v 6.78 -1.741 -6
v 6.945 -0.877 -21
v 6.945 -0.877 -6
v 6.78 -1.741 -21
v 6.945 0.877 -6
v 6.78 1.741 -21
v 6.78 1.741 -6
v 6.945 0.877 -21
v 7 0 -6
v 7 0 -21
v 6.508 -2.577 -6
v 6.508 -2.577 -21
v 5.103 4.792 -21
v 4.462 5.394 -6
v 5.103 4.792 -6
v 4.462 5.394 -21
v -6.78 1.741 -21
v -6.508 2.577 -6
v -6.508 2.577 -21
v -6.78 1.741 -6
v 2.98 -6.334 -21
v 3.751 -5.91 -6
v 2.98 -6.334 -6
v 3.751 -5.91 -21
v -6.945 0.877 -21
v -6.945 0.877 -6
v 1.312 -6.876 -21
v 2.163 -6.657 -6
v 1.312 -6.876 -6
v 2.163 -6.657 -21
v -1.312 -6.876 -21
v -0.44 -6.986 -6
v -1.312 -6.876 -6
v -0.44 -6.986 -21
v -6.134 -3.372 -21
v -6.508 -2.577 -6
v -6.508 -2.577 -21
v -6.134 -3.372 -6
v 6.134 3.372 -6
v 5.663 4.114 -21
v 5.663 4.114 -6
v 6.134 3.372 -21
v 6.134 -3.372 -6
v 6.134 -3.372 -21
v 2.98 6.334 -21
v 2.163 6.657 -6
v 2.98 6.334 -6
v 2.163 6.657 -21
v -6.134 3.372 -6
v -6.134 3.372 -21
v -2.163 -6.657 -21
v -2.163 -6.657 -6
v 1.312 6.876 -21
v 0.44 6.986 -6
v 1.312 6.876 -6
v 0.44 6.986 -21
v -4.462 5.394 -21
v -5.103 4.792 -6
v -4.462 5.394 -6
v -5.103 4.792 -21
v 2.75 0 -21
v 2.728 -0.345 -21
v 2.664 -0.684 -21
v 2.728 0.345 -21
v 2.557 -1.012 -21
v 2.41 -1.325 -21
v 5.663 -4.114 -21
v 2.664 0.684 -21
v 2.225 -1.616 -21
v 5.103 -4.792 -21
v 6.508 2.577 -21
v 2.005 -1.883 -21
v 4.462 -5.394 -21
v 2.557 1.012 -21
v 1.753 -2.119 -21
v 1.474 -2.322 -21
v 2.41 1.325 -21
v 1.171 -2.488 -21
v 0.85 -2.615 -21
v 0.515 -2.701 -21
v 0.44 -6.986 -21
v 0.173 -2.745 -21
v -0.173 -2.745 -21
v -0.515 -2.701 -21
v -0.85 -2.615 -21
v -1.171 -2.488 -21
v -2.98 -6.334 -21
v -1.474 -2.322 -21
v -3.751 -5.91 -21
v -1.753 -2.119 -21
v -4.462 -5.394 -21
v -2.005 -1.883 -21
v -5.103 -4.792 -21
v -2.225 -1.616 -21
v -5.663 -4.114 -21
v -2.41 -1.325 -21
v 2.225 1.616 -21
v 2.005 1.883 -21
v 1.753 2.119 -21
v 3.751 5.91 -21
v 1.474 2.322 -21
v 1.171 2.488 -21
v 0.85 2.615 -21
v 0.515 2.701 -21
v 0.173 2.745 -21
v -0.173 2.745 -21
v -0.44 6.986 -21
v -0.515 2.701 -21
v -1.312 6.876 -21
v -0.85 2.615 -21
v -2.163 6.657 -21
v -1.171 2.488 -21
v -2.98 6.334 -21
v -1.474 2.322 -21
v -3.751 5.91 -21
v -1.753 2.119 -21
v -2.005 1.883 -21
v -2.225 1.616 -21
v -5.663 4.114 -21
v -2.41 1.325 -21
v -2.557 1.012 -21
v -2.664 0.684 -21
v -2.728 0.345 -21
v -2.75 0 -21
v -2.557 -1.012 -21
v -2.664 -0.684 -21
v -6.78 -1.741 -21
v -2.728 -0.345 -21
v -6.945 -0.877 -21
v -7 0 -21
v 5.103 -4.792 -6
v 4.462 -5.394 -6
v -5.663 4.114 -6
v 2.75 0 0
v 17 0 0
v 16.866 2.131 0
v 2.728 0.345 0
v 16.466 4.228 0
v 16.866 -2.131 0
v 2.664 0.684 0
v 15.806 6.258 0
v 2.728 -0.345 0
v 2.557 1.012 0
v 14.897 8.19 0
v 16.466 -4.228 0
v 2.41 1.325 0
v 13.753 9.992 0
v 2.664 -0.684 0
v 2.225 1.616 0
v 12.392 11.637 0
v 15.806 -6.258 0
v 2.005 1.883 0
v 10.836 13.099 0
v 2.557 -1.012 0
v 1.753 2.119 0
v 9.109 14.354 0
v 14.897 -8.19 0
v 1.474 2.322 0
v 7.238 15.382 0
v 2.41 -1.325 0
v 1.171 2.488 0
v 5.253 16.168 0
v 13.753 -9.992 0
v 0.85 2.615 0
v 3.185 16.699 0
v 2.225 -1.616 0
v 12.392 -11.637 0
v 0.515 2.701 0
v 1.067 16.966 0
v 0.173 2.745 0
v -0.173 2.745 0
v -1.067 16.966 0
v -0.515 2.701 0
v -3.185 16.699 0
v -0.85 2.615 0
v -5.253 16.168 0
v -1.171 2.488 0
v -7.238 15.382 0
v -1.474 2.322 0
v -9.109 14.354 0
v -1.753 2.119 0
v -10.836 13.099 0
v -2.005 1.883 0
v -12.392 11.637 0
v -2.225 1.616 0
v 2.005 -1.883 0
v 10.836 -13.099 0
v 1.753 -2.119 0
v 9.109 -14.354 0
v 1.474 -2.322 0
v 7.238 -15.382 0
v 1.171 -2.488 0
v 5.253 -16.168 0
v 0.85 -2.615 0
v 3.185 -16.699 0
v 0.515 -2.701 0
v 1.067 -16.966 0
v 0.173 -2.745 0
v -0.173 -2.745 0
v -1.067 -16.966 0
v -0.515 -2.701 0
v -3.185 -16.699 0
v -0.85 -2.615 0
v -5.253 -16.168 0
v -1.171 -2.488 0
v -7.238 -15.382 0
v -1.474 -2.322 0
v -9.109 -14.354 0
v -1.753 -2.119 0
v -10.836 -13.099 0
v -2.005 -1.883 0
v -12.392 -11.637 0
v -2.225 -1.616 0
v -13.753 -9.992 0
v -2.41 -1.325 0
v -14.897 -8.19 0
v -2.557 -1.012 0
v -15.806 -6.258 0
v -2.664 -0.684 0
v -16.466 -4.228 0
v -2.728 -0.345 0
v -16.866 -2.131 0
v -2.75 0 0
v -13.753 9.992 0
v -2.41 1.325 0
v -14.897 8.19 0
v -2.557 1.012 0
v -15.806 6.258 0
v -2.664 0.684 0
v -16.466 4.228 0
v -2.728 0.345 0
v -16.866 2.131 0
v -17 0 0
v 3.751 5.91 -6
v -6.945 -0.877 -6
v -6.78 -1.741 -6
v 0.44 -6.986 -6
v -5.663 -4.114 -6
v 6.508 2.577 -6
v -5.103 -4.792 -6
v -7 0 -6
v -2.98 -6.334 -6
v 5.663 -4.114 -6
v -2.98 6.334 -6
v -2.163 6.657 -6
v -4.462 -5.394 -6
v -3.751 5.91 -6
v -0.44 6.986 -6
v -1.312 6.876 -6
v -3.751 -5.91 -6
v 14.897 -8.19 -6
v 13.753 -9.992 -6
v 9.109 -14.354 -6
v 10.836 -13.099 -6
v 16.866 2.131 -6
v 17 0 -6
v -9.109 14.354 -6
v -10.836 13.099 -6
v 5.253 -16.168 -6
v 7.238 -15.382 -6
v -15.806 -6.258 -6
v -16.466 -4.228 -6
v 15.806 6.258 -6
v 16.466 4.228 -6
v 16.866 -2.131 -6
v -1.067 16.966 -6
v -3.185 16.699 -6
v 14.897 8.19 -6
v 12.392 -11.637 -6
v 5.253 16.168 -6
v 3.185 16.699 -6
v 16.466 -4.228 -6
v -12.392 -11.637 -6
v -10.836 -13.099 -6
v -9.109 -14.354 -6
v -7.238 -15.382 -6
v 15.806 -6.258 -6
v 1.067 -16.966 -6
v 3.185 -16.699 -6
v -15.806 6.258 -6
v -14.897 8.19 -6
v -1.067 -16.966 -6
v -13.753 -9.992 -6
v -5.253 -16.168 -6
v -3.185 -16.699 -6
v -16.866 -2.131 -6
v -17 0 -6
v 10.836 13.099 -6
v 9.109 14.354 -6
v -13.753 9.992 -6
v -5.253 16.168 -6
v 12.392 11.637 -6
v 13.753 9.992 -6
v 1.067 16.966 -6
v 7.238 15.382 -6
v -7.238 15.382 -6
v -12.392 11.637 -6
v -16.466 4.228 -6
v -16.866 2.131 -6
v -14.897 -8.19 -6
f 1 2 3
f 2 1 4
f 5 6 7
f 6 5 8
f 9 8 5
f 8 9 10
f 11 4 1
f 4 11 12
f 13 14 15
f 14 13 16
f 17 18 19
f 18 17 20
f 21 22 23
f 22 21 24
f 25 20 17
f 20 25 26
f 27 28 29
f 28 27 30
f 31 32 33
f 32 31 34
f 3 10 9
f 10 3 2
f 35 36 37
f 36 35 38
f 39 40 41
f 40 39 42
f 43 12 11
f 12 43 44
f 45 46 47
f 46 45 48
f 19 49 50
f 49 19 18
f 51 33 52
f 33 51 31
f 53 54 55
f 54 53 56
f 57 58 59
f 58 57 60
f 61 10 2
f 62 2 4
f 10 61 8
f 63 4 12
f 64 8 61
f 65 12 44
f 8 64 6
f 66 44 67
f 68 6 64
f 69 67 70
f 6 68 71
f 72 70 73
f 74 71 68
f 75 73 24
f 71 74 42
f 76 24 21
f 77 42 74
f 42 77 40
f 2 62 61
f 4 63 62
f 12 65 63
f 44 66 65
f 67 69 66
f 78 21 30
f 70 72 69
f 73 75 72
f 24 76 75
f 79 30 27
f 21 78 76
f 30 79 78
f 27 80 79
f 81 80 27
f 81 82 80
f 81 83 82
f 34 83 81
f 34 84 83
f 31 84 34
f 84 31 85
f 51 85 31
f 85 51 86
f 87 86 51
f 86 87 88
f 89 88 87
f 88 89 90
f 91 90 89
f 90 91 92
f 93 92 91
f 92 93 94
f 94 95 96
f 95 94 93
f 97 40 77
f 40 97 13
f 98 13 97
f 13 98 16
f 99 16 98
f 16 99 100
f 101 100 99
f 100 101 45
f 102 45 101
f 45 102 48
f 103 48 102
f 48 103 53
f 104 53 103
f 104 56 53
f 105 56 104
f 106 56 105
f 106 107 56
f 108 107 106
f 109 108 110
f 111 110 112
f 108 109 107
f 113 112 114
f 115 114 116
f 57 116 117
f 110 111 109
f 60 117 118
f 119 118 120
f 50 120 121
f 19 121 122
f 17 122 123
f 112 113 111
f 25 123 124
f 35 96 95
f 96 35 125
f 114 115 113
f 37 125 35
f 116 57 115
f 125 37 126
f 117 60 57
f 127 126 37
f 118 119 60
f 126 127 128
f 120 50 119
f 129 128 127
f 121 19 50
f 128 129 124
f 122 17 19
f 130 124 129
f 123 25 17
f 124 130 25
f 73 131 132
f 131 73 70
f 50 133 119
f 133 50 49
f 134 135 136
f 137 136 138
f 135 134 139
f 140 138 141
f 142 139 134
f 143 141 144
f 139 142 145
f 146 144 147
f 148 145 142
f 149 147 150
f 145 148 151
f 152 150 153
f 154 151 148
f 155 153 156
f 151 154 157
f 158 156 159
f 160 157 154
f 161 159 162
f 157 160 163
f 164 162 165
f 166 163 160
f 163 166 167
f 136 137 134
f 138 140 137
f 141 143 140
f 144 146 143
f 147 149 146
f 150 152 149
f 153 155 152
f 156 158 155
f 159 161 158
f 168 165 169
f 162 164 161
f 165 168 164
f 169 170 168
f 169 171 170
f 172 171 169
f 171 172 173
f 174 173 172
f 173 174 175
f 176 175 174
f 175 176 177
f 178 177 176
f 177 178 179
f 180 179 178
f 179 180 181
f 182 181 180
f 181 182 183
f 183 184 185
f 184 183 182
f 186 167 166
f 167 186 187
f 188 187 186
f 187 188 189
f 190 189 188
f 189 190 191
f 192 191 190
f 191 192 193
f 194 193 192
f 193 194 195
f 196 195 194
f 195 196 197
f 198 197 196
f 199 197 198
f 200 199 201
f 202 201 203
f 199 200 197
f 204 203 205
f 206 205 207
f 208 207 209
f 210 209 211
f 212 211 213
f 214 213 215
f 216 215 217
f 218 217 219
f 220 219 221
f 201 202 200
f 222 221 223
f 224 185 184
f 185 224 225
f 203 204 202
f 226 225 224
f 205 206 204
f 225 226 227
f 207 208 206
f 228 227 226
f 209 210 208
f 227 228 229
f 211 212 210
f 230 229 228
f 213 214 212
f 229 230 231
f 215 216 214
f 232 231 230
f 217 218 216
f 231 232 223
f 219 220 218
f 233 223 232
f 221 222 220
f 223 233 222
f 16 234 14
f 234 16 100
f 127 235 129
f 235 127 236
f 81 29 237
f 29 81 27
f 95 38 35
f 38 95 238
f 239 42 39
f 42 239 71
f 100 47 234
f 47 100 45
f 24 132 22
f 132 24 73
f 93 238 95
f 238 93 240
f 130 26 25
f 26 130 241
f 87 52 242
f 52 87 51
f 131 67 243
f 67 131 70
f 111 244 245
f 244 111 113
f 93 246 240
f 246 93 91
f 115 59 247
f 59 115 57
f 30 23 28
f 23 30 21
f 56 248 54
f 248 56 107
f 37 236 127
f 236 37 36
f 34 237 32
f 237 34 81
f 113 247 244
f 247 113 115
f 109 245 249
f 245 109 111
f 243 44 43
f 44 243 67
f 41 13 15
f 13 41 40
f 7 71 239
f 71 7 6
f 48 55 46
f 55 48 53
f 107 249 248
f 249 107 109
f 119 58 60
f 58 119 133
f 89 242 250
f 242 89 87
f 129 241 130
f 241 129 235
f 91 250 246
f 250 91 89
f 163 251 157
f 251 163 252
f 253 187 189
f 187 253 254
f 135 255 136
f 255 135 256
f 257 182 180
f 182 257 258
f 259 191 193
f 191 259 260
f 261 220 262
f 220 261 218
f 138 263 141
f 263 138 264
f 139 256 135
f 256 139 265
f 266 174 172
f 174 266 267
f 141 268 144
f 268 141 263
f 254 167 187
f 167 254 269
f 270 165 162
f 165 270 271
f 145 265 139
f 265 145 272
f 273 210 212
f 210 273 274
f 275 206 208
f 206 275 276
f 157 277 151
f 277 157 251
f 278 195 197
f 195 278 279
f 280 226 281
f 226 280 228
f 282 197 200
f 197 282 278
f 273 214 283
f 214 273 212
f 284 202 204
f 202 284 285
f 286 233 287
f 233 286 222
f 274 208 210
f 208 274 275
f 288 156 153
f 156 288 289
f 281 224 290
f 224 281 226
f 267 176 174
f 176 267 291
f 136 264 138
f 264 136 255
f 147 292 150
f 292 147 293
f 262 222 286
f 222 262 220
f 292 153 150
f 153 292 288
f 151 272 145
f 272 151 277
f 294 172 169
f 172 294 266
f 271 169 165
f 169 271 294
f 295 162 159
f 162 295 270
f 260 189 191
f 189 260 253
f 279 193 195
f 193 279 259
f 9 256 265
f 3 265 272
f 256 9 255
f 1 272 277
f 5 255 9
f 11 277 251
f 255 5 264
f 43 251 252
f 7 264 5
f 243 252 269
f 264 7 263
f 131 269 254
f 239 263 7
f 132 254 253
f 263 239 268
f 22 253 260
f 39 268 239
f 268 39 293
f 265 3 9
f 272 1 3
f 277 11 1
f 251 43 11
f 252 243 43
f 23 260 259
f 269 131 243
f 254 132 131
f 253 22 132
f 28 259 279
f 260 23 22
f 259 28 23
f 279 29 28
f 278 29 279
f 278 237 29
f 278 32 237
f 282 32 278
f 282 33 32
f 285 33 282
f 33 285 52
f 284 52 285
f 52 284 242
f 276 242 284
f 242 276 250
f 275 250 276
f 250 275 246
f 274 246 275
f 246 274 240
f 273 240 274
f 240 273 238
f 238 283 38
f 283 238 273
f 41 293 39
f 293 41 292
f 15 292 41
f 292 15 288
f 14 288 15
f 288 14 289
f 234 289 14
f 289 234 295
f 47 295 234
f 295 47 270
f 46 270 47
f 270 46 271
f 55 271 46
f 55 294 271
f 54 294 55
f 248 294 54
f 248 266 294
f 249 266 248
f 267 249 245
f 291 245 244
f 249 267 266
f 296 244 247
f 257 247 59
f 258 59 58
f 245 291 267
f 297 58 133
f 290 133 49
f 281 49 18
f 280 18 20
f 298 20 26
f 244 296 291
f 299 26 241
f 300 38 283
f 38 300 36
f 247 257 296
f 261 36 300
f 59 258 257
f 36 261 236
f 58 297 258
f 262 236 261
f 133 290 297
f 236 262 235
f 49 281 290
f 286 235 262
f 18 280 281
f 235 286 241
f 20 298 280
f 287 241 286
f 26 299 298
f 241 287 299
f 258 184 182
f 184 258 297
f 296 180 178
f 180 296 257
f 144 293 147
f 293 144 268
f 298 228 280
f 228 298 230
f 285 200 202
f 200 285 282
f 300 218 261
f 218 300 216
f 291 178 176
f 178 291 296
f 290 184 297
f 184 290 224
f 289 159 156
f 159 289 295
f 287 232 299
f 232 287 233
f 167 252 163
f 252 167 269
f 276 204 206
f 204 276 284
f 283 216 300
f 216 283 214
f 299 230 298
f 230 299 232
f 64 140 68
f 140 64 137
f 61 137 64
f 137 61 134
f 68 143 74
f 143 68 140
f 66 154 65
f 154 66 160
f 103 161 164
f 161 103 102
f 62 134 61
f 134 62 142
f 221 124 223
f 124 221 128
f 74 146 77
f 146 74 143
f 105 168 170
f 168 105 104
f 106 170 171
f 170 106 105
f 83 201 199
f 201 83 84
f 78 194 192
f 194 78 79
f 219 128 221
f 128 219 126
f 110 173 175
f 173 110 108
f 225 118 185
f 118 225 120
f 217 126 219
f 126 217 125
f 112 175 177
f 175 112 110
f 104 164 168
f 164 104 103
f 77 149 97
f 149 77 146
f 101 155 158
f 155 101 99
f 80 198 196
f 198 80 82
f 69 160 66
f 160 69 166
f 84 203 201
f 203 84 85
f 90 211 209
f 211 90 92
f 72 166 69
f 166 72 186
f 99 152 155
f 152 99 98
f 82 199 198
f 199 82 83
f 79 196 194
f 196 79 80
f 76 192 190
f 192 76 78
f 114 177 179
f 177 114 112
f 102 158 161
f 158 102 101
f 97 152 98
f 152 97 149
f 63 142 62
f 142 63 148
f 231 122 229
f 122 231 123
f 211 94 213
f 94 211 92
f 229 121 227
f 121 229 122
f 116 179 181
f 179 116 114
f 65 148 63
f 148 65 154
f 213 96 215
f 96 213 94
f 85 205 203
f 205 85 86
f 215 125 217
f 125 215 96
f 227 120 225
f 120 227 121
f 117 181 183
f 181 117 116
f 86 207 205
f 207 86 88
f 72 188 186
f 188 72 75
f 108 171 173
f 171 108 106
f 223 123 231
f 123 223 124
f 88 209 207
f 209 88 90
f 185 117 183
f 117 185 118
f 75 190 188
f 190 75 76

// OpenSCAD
$fn = 50;


difference() {
	union() {
		translate(v = [0, 0, -21.0000000000]) {
			cylinder(h = 21, r = 7.0000000000);
		}
		translate(v = [0, 0, -6.0000000000]) {
			cylinder(h = 6, r = 17.0000000000);
		}
	}
	union() {
		#translate(v = [0, 0, -21]) {
			cylinder(h = 21, r = 2.7500000000);
		}
	}
}
